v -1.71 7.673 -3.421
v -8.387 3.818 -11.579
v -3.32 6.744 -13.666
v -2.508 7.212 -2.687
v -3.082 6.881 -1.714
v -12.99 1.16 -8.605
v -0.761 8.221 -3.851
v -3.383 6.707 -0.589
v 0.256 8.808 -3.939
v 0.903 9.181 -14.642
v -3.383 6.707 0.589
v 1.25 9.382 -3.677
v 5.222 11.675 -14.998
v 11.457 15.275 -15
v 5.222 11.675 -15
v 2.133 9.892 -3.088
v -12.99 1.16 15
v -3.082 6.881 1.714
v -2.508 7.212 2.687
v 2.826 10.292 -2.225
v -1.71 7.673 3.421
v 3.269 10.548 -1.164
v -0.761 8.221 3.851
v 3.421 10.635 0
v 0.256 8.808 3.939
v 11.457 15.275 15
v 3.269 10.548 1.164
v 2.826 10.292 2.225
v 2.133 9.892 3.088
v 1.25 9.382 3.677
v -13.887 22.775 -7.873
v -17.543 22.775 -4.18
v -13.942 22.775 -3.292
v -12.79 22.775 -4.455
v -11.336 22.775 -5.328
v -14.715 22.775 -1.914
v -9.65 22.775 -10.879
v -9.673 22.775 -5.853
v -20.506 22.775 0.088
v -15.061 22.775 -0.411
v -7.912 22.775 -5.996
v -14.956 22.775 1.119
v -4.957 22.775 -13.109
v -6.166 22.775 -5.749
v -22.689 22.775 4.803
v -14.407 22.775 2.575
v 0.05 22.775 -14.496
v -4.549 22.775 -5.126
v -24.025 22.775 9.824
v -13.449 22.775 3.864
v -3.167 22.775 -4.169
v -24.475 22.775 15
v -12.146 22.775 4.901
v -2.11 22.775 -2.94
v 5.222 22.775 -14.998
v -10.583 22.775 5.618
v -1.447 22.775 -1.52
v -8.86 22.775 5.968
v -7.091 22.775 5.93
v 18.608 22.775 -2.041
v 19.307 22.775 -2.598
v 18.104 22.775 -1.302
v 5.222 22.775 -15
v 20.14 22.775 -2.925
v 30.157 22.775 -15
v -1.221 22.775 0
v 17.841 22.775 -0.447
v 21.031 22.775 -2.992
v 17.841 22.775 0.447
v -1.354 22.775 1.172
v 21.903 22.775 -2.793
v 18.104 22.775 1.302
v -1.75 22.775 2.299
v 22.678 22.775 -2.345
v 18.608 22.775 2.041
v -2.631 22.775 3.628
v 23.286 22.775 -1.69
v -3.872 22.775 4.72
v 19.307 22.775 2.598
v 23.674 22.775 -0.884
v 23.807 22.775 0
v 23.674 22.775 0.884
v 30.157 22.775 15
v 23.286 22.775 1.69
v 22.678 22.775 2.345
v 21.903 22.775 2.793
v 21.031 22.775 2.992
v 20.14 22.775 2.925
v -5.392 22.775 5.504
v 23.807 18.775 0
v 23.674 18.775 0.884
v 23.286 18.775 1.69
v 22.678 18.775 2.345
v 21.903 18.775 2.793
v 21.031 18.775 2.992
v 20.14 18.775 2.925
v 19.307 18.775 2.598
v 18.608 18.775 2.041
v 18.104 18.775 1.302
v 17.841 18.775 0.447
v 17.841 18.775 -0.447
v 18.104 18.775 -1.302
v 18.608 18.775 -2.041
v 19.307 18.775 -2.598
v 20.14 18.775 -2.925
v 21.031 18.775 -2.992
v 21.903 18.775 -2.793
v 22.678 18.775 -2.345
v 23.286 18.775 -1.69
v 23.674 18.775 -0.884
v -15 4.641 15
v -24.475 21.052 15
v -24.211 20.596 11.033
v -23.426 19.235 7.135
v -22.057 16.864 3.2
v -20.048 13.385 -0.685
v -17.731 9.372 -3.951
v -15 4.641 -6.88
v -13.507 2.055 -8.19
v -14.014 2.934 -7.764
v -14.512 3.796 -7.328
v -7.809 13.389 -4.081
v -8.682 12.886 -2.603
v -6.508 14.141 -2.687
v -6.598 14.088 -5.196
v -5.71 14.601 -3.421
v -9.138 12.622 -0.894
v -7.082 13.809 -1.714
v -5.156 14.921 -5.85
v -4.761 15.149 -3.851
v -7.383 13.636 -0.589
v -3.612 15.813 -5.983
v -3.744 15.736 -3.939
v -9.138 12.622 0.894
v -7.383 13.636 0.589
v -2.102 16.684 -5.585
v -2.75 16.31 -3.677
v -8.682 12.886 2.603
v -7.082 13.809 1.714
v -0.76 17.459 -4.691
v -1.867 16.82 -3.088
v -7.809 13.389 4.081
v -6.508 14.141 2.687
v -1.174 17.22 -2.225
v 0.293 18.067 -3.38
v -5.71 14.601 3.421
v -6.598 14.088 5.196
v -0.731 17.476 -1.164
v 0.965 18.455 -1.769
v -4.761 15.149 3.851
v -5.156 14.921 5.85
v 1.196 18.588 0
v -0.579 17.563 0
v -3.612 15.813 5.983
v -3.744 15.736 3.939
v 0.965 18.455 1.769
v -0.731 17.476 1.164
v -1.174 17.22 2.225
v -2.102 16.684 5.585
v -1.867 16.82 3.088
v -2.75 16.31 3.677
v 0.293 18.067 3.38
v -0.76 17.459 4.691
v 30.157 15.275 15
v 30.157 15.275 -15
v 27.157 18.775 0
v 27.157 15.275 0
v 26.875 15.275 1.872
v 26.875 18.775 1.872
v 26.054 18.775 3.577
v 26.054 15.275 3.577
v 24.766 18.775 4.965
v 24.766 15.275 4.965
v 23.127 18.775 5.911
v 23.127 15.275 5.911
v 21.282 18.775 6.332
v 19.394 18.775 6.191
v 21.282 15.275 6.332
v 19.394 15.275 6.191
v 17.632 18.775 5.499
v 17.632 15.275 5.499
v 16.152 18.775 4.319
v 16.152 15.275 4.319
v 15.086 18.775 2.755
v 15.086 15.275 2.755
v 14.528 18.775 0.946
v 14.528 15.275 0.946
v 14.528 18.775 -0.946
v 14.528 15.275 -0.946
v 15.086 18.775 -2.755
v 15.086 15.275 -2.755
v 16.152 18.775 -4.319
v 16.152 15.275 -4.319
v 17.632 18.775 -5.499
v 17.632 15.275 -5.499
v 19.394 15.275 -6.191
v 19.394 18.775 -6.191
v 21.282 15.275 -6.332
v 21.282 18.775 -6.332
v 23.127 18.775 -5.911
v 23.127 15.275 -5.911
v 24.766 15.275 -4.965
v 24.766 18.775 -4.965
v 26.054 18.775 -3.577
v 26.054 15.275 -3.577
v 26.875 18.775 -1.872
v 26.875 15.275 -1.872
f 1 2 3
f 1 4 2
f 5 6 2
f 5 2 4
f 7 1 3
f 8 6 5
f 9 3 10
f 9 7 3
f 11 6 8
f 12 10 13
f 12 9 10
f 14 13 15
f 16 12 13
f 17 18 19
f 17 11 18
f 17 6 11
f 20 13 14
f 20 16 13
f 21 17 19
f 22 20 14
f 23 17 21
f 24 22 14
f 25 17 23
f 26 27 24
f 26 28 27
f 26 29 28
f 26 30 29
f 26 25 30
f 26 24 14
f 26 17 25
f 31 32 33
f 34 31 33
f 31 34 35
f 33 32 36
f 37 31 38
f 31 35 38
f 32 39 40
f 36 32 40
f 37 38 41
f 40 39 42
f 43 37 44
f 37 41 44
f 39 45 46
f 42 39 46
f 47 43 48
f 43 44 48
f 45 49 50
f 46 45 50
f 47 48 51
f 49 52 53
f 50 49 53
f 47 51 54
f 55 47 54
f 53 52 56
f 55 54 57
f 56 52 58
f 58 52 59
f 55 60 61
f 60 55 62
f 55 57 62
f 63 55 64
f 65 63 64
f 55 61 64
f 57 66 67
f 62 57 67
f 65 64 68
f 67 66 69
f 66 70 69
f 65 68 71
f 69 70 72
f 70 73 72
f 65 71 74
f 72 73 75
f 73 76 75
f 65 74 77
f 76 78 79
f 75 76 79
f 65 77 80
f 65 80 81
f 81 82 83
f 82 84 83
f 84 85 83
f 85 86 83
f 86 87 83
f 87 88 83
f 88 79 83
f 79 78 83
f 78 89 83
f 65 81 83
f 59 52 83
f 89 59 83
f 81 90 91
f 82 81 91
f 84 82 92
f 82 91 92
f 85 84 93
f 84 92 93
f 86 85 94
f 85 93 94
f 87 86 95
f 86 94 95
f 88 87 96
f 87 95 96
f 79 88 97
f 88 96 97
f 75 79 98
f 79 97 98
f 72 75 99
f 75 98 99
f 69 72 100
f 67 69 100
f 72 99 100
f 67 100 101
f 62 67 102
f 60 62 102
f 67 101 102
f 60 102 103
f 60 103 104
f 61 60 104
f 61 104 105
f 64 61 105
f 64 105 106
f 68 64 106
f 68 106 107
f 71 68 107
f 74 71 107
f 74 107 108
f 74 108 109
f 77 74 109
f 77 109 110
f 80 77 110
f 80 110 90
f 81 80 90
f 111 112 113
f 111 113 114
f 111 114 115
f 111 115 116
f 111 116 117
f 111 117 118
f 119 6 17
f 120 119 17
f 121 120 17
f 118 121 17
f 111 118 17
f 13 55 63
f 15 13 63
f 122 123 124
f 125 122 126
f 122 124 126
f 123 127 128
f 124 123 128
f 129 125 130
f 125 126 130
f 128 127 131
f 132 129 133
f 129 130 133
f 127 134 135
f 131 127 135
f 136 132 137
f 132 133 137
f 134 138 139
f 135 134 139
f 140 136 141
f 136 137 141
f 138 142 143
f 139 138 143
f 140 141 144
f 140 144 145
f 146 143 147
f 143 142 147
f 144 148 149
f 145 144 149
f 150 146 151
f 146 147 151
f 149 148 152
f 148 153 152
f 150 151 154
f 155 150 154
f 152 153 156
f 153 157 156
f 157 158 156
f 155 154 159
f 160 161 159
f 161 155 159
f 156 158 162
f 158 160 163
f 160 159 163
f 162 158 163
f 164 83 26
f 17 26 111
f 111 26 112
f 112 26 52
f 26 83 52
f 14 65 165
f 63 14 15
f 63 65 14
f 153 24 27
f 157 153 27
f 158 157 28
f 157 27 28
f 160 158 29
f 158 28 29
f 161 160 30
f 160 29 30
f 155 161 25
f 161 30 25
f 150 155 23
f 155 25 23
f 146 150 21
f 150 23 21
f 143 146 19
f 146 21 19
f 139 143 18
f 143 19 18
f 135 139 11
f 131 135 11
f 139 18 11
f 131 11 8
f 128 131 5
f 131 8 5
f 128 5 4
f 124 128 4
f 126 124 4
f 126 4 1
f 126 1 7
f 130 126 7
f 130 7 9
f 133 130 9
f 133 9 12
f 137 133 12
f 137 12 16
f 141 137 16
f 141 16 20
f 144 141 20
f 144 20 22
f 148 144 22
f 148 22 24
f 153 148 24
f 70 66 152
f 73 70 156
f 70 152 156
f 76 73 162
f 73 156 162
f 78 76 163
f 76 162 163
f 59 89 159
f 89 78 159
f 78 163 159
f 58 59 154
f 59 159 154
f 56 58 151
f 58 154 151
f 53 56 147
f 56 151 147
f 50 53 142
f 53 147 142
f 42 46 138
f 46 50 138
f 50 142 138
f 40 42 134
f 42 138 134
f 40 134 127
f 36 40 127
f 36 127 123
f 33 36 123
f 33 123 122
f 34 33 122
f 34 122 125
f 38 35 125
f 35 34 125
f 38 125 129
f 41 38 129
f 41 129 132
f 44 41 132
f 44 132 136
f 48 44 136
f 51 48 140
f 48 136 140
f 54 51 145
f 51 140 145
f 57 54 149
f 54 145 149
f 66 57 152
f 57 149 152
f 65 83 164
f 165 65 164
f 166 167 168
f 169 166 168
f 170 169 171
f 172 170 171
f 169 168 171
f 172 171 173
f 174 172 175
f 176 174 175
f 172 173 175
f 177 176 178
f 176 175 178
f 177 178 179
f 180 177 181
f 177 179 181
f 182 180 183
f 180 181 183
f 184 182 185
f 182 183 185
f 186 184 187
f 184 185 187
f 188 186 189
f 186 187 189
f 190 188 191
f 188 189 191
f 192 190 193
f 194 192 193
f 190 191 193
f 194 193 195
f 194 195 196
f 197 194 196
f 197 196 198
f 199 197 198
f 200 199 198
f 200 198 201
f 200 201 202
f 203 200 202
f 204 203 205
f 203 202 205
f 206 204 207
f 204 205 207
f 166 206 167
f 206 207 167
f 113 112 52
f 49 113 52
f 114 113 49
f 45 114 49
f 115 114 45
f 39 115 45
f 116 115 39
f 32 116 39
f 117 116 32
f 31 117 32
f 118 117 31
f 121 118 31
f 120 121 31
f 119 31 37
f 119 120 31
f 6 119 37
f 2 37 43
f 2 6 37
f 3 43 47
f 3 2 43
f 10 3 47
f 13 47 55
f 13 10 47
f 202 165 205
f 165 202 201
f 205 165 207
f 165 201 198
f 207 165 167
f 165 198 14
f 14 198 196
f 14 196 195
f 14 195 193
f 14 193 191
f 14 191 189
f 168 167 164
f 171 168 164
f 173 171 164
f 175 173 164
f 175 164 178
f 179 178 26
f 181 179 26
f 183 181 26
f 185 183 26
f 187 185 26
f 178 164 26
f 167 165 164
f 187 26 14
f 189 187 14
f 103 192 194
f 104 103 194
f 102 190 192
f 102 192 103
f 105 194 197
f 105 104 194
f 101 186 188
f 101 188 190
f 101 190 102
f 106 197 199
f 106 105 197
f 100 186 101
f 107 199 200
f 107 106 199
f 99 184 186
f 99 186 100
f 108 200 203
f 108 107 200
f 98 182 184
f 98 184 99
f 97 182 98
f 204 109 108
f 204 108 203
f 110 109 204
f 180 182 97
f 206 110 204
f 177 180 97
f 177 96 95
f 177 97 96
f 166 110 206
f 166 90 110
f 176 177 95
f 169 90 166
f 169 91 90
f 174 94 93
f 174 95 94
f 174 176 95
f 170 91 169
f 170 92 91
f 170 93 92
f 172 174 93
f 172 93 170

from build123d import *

# Parameters (mm, degrees)
ESBO_O1_W                = 30
ESBO_O1_H                = 30
RESSALTO_EXTRUS_O1_DEPTH = 22.775
CORTE_EXTRUS_O1_DEPTH    = 41.542577927
ESBO_O3_OUTSIDE_W        = 48.998
ESBO_O3_OUTSIDE_H        = 41.63
ESBO_O3_OUTSIDE_W_2      = 30
ESBO_O3_OUTSIDE_H_2      = 30
CORTE_EXTRUS_O2_DEPTH    = 30.010251575
RESSALTO_EXTRUS_O2_DEPTH = 30
ESBO_O5_R                = 3.95
CORTE_EXTRUS_O3_DEPTH    = 32.012511133
CORTE_EXTRUS_O5_START    = -8
ESBO_O8_R                = 6
CORTE_EXTRUS_O5_DEPTH    = 25
RESSALTO_EXTRUS_O6_DEPTH = 30
CORTE_EXTRUS_O11_START   = -21.614745962
CORTE_EXTRUS_O11_DEPTH   = 21.614745962
ESBO_O19_R               = 6.35
CORTE_EXTRUS_O12_DEPTH   = 3.5
ESBO_O20_R               = 3
CORTE_EXTRUS_O13_DEPTH   = 26


with BuildPart() as part:
    # Esboço1 → Ressalto-extrusão1 (new body)
    with BuildSketch(Plane(origin=(0, 0, 0), x_dir=(1, 0, 0), z_dir=(0, 1, 0))):
        Rectangle(ESBO_O1_W, ESBO_O1_H)
    extrude(amount=RESSALTO_EXTRUS_O1_DEPTH)

    # Esboço2 → Corte-extrusão1 (cut, through all)
    with BuildSketch(Plane.XY.offset(15)):
        Polygon((-15, 0), (15, 17.320508076), (15, 0), align=None)
    extrude(amount=-CORTE_EXTRUS_O1_DEPTH, mode=Mode.SUBTRACT)

    # Esboço3 outside → Corte-extrusão2 (cut, through all)
    with BuildSketch(Plane(origin=(-3.75, 6.495190528, 0), x_dir=(0.8660254037844378, 0.5000000000000017, 0), z_dir=(0.5000000000000016, -0.8660254037844377, 0))):
        with Locations((5.694, 0)):
            Rectangle(ESBO_O3_OUTSIDE_W, ESBO_O3_OUTSIDE_H)
        with Locations((4.330127019, 0)):
            Rectangle(ESBO_O3_OUTSIDE_W_2, ESBO_O3_OUTSIDE_H_2, mode=Mode.SUBTRACT)
    extrude(amount=-CORTE_EXTRUS_O2_DEPTH, mode=Mode.SUBTRACT)

    # Esboço4 → Ressalto-extrusão2 (add)
    with BuildSketch(Plane.XY.offset(15)):
        Polygon((-25.469660456, 22.775), (-15, 4.641016151), (-15, 22.775), align=None)
    extrude(amount=-RESSALTO_EXTRUS_O2_DEPTH)

    # Esboço5 → Corte-extrusão3 (cut, through all)
    with BuildSketch(Plane(origin=(-3.75, 6.495190528, 0), x_dir=(-0.8660254037844379, -0.5000000000000013, 0), z_dir=(0.5000000000000013, -0.8660254037844379, 0))):
        with Locations(Location((-4.330131096, -4.077e-06, 0), (0, 0, 180))):
            Circle(ESBO_O5_R)
    extrude(amount=-CORTE_EXTRUS_O3_DEPTH, mode=Mode.SUBTRACT)

    # Esboço8 → Corte-extrusão5 (cut)
    with BuildSketch(Plane(origin=(-3.75, 6.495190528, 0), x_dir=(0.8660254037844379, 0.5000000000000013, 0), z_dir=(0.5000000000000013, -0.8660254037844379, 0)).offset(CORTE_EXTRUS_O5_START)):
        with Locations((4.330131096, 4.077e-06)):
            Circle(ESBO_O8_R)
    extrude(amount=-CORTE_EXTRUS_O5_DEPTH, mode=Mode.SUBTRACT)

    # Esboço16 → Ressalto-extrusão6 (add)
    with BuildSketch(Plane.XY.offset(15)):
        Polygon((9.171355695, 22.775), (30.157076086, 22.775), (30.157076086, 15.275), (11.457076086, 15.275), align=None)
    extrude(amount=-RESSALTO_EXTRUS_O6_DEPTH)

    # Corte-extrusão11: read off the stored shape, not the designer's step
    # Corte-extrusão11 outline → Corte-extrusão11 (cut)
    with BuildSketch(Plane(origin=(0, 22.775, 0), x_dir=(1, 0, 0), z_dir=(0, 1, 0)).offset(CORTE_EXTRUS_O11_START)):
        with BuildLine():
            ThreePointArc((-24.474983506, -14.999998017), (-15.795064462, 6.105795279), (5.221968287, 14.998479898))
            Line((5.221968287, 14.998479898), (5.221968287, 15))
            Line((5.221968287, 15), (-26, 15))
            Line((-26, 15), (-26, -16))
            Line((-26, -16), (-24.47498322, -16))
            Line((-24.47498322, -16), (-24.474983506, -14.999998017))
        make_face()
    extrude(amount=CORTE_EXTRUS_O11_DEPTH, mode=Mode.SUBTRACT)

    # Esboço19 → Corte-extrusão12 (cut)
    with BuildSketch(Plane.XZ.offset(-15.275)):
        with Locations((20.807076086, 0)):
            Circle(ESBO_O19_R)
    extrude(amount=-CORTE_EXTRUS_O12_DEPTH, mode=Mode.SUBTRACT)

    # Esboço20 → Corte-extrusão13 (cut)
    with BuildSketch(Plane.XZ.offset(-18.775)):
        with Locations((20.807076086, 0)):
            Circle(ESBO_O20_R)
    extrude(amount=-CORTE_EXTRUS_O13_DEPTH, mode=Mode.SUBTRACT)


solid = part.part
